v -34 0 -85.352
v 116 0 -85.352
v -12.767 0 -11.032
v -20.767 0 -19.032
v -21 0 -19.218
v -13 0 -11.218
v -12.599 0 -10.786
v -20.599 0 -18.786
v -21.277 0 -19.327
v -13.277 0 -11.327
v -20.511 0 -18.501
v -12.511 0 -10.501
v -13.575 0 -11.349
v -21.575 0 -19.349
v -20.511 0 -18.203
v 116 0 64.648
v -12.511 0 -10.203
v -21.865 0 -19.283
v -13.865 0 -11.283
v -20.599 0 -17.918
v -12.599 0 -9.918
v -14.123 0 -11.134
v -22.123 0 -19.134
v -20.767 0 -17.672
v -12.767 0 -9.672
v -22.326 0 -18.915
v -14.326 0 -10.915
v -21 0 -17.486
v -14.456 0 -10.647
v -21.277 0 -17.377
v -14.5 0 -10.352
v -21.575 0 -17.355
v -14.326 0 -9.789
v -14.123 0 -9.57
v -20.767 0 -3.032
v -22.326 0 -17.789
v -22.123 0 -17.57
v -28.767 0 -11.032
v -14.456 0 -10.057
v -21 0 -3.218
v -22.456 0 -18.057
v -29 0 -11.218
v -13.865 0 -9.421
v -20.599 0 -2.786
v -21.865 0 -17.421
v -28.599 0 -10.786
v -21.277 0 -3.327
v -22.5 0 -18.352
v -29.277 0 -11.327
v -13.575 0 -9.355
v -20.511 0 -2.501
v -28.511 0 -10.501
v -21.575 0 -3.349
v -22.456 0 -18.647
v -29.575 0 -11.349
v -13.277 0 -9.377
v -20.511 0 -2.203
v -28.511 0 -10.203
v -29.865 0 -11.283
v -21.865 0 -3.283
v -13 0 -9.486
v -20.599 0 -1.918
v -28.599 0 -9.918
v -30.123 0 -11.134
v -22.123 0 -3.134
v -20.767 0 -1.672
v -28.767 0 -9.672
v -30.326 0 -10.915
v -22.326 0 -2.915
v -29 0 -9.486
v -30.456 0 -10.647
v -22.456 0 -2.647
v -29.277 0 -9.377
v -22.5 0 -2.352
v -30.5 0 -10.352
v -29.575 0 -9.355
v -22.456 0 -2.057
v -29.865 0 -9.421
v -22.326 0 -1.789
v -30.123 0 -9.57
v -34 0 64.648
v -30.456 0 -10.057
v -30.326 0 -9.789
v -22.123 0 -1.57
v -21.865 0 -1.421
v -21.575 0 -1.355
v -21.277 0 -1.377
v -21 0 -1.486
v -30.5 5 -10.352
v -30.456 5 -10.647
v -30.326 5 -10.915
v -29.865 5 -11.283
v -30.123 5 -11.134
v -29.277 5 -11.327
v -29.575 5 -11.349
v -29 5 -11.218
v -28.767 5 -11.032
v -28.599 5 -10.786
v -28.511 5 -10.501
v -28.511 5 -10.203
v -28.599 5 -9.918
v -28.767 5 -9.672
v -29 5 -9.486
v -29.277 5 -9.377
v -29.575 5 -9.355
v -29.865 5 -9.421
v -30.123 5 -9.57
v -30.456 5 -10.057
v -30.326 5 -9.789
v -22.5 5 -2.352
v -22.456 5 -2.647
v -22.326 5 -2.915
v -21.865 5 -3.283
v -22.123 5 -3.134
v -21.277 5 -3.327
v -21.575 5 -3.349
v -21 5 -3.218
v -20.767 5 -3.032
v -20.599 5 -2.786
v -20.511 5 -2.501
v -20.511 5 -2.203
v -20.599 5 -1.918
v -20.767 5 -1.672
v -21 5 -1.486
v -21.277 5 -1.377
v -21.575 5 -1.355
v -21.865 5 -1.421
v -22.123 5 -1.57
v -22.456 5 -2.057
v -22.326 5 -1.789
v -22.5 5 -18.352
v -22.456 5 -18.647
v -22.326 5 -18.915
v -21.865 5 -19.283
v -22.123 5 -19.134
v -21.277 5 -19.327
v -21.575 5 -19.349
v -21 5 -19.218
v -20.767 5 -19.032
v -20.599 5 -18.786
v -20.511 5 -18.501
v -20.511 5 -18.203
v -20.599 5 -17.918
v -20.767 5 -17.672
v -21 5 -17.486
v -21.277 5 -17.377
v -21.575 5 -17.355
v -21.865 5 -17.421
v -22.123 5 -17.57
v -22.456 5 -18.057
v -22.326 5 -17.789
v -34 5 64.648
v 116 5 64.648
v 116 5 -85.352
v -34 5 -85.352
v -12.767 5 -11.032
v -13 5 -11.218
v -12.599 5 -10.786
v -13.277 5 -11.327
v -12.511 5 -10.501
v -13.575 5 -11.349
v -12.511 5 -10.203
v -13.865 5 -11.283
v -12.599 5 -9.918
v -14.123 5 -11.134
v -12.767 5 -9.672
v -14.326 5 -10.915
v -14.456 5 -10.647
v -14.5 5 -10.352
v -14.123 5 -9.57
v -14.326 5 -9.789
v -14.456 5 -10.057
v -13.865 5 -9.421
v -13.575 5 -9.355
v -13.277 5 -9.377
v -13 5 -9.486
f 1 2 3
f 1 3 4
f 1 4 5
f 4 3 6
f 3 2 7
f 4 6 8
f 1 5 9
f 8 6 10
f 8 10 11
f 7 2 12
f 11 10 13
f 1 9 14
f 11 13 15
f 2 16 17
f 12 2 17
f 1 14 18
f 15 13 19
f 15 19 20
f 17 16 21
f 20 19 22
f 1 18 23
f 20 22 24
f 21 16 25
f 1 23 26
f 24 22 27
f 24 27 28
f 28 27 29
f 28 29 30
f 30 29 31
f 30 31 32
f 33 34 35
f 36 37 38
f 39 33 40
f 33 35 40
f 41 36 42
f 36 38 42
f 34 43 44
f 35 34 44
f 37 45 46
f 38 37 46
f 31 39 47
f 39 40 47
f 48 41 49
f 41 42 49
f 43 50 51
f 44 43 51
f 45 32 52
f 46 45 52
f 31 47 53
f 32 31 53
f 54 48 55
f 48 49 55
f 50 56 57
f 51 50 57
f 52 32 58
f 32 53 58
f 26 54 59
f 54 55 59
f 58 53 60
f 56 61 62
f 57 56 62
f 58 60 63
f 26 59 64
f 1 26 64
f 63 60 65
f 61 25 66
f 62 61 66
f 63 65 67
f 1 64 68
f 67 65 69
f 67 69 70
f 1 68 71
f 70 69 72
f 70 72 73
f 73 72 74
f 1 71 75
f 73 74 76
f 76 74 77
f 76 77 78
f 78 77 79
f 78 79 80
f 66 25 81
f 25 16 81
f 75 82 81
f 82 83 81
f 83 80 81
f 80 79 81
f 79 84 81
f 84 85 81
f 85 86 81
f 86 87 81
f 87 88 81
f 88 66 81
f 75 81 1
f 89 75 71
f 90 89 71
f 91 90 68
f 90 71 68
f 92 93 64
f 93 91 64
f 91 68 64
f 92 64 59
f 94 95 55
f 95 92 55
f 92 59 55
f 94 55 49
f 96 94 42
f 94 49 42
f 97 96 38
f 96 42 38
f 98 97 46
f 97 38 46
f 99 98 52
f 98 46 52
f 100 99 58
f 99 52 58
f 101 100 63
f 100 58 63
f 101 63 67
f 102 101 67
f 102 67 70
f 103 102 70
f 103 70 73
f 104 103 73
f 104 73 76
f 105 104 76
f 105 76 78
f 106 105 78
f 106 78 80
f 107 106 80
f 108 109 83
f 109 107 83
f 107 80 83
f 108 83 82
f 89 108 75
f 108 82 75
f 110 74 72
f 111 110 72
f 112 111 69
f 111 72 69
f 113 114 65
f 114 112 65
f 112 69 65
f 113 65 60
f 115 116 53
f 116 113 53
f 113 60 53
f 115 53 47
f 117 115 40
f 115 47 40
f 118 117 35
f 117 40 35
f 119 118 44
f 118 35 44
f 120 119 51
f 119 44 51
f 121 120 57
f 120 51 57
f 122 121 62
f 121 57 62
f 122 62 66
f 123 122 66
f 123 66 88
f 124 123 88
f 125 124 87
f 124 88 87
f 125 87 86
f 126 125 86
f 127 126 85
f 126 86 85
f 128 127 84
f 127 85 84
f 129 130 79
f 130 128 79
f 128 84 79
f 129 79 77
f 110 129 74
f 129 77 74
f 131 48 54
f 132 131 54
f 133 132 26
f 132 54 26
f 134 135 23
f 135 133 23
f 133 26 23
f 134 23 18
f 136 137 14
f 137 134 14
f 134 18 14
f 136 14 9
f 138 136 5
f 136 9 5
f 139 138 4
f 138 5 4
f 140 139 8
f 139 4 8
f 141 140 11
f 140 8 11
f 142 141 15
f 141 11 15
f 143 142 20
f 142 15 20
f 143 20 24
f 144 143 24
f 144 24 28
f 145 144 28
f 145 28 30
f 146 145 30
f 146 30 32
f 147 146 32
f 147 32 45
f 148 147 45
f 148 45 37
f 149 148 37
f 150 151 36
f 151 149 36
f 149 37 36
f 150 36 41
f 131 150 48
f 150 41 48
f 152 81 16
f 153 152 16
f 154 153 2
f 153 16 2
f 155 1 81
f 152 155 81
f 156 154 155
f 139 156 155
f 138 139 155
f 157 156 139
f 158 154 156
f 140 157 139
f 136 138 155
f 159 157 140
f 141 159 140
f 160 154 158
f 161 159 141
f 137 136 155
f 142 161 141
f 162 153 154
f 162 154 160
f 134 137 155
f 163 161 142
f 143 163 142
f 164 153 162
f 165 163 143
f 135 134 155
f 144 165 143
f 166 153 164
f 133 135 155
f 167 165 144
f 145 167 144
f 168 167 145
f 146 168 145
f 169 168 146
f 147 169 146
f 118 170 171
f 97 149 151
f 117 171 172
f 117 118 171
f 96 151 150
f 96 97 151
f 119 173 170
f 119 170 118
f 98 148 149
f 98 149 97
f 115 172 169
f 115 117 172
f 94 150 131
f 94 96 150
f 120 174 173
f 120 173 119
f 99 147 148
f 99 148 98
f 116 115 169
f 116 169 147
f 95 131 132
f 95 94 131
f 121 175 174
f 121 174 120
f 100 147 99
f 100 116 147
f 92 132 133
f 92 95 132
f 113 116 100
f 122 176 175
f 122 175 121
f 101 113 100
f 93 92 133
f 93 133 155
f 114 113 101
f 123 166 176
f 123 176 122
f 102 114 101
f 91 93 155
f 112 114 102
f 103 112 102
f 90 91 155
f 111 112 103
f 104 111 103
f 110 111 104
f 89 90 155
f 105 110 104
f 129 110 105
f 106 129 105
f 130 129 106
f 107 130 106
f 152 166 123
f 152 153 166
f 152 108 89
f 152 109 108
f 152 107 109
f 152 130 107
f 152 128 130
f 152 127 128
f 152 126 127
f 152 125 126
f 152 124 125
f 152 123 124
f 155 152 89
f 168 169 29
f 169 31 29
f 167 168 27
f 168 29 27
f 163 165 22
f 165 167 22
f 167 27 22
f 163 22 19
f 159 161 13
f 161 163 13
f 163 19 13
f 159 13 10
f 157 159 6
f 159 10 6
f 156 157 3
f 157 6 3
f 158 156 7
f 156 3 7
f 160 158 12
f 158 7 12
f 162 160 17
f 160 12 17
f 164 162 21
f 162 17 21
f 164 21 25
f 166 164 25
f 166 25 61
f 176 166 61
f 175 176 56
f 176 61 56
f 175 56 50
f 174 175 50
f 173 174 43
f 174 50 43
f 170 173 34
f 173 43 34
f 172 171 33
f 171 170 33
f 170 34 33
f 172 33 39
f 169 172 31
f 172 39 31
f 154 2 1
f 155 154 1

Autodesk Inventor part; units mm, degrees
ref_plane "YZ Plane" through (0, 0, 0) normal (1, 0, 0) x (0, 1, 0)
ref_plane "XZ Plane" through (0, 0, 0) normal (0, 1, 0) x (-1, 0, 0)
ref_plane "XY Plane" through (0, 0, 0) normal (0, 0, 1) x (1, 0, 0)
sketch "Sketch1" plane through (0, 0, 0) normal (0, 1, 0) x (-1, 0, 0)
  line L0 (34, 64.6479) -> (-116, 64.6479)
  line L1 (-116, 64.6479) -> (-116, -85.3521)
  line L2 (-116, -85.3521) -> (34, -85.3521)
  line L3 (34, -85.3521) -> (34, 64.6479)
  circle A0 centre (29.5, -10.3521) radius 1
  circle A1 centre (13.5, -10.3521) radius 1
  circle A2 centre (21.5, -18.3521) radius 1
  circle A3 centre (21.5, -2.3521) radius 1
  point P0 (0, 0)
  dimension "d0" = 150
  dimension "d1" = 150
  dimension "d4" = 75
  dimension "d5" = 4.5
  dimension "d6" = 2
  dimension "d16" = 16
  dimension "d17" = 2
  dimension "d18" = 75
  dimension "d19" = 2
  dimension "d20" = 8
  dimension "d21" = 8
  dimension "d22" = 2
  dimension "d23" = 8
  dimension "d24" = 8
extrude "Extrusion1" add sketch "Sketch1" along normal blind 5
properties part number "plaque"
